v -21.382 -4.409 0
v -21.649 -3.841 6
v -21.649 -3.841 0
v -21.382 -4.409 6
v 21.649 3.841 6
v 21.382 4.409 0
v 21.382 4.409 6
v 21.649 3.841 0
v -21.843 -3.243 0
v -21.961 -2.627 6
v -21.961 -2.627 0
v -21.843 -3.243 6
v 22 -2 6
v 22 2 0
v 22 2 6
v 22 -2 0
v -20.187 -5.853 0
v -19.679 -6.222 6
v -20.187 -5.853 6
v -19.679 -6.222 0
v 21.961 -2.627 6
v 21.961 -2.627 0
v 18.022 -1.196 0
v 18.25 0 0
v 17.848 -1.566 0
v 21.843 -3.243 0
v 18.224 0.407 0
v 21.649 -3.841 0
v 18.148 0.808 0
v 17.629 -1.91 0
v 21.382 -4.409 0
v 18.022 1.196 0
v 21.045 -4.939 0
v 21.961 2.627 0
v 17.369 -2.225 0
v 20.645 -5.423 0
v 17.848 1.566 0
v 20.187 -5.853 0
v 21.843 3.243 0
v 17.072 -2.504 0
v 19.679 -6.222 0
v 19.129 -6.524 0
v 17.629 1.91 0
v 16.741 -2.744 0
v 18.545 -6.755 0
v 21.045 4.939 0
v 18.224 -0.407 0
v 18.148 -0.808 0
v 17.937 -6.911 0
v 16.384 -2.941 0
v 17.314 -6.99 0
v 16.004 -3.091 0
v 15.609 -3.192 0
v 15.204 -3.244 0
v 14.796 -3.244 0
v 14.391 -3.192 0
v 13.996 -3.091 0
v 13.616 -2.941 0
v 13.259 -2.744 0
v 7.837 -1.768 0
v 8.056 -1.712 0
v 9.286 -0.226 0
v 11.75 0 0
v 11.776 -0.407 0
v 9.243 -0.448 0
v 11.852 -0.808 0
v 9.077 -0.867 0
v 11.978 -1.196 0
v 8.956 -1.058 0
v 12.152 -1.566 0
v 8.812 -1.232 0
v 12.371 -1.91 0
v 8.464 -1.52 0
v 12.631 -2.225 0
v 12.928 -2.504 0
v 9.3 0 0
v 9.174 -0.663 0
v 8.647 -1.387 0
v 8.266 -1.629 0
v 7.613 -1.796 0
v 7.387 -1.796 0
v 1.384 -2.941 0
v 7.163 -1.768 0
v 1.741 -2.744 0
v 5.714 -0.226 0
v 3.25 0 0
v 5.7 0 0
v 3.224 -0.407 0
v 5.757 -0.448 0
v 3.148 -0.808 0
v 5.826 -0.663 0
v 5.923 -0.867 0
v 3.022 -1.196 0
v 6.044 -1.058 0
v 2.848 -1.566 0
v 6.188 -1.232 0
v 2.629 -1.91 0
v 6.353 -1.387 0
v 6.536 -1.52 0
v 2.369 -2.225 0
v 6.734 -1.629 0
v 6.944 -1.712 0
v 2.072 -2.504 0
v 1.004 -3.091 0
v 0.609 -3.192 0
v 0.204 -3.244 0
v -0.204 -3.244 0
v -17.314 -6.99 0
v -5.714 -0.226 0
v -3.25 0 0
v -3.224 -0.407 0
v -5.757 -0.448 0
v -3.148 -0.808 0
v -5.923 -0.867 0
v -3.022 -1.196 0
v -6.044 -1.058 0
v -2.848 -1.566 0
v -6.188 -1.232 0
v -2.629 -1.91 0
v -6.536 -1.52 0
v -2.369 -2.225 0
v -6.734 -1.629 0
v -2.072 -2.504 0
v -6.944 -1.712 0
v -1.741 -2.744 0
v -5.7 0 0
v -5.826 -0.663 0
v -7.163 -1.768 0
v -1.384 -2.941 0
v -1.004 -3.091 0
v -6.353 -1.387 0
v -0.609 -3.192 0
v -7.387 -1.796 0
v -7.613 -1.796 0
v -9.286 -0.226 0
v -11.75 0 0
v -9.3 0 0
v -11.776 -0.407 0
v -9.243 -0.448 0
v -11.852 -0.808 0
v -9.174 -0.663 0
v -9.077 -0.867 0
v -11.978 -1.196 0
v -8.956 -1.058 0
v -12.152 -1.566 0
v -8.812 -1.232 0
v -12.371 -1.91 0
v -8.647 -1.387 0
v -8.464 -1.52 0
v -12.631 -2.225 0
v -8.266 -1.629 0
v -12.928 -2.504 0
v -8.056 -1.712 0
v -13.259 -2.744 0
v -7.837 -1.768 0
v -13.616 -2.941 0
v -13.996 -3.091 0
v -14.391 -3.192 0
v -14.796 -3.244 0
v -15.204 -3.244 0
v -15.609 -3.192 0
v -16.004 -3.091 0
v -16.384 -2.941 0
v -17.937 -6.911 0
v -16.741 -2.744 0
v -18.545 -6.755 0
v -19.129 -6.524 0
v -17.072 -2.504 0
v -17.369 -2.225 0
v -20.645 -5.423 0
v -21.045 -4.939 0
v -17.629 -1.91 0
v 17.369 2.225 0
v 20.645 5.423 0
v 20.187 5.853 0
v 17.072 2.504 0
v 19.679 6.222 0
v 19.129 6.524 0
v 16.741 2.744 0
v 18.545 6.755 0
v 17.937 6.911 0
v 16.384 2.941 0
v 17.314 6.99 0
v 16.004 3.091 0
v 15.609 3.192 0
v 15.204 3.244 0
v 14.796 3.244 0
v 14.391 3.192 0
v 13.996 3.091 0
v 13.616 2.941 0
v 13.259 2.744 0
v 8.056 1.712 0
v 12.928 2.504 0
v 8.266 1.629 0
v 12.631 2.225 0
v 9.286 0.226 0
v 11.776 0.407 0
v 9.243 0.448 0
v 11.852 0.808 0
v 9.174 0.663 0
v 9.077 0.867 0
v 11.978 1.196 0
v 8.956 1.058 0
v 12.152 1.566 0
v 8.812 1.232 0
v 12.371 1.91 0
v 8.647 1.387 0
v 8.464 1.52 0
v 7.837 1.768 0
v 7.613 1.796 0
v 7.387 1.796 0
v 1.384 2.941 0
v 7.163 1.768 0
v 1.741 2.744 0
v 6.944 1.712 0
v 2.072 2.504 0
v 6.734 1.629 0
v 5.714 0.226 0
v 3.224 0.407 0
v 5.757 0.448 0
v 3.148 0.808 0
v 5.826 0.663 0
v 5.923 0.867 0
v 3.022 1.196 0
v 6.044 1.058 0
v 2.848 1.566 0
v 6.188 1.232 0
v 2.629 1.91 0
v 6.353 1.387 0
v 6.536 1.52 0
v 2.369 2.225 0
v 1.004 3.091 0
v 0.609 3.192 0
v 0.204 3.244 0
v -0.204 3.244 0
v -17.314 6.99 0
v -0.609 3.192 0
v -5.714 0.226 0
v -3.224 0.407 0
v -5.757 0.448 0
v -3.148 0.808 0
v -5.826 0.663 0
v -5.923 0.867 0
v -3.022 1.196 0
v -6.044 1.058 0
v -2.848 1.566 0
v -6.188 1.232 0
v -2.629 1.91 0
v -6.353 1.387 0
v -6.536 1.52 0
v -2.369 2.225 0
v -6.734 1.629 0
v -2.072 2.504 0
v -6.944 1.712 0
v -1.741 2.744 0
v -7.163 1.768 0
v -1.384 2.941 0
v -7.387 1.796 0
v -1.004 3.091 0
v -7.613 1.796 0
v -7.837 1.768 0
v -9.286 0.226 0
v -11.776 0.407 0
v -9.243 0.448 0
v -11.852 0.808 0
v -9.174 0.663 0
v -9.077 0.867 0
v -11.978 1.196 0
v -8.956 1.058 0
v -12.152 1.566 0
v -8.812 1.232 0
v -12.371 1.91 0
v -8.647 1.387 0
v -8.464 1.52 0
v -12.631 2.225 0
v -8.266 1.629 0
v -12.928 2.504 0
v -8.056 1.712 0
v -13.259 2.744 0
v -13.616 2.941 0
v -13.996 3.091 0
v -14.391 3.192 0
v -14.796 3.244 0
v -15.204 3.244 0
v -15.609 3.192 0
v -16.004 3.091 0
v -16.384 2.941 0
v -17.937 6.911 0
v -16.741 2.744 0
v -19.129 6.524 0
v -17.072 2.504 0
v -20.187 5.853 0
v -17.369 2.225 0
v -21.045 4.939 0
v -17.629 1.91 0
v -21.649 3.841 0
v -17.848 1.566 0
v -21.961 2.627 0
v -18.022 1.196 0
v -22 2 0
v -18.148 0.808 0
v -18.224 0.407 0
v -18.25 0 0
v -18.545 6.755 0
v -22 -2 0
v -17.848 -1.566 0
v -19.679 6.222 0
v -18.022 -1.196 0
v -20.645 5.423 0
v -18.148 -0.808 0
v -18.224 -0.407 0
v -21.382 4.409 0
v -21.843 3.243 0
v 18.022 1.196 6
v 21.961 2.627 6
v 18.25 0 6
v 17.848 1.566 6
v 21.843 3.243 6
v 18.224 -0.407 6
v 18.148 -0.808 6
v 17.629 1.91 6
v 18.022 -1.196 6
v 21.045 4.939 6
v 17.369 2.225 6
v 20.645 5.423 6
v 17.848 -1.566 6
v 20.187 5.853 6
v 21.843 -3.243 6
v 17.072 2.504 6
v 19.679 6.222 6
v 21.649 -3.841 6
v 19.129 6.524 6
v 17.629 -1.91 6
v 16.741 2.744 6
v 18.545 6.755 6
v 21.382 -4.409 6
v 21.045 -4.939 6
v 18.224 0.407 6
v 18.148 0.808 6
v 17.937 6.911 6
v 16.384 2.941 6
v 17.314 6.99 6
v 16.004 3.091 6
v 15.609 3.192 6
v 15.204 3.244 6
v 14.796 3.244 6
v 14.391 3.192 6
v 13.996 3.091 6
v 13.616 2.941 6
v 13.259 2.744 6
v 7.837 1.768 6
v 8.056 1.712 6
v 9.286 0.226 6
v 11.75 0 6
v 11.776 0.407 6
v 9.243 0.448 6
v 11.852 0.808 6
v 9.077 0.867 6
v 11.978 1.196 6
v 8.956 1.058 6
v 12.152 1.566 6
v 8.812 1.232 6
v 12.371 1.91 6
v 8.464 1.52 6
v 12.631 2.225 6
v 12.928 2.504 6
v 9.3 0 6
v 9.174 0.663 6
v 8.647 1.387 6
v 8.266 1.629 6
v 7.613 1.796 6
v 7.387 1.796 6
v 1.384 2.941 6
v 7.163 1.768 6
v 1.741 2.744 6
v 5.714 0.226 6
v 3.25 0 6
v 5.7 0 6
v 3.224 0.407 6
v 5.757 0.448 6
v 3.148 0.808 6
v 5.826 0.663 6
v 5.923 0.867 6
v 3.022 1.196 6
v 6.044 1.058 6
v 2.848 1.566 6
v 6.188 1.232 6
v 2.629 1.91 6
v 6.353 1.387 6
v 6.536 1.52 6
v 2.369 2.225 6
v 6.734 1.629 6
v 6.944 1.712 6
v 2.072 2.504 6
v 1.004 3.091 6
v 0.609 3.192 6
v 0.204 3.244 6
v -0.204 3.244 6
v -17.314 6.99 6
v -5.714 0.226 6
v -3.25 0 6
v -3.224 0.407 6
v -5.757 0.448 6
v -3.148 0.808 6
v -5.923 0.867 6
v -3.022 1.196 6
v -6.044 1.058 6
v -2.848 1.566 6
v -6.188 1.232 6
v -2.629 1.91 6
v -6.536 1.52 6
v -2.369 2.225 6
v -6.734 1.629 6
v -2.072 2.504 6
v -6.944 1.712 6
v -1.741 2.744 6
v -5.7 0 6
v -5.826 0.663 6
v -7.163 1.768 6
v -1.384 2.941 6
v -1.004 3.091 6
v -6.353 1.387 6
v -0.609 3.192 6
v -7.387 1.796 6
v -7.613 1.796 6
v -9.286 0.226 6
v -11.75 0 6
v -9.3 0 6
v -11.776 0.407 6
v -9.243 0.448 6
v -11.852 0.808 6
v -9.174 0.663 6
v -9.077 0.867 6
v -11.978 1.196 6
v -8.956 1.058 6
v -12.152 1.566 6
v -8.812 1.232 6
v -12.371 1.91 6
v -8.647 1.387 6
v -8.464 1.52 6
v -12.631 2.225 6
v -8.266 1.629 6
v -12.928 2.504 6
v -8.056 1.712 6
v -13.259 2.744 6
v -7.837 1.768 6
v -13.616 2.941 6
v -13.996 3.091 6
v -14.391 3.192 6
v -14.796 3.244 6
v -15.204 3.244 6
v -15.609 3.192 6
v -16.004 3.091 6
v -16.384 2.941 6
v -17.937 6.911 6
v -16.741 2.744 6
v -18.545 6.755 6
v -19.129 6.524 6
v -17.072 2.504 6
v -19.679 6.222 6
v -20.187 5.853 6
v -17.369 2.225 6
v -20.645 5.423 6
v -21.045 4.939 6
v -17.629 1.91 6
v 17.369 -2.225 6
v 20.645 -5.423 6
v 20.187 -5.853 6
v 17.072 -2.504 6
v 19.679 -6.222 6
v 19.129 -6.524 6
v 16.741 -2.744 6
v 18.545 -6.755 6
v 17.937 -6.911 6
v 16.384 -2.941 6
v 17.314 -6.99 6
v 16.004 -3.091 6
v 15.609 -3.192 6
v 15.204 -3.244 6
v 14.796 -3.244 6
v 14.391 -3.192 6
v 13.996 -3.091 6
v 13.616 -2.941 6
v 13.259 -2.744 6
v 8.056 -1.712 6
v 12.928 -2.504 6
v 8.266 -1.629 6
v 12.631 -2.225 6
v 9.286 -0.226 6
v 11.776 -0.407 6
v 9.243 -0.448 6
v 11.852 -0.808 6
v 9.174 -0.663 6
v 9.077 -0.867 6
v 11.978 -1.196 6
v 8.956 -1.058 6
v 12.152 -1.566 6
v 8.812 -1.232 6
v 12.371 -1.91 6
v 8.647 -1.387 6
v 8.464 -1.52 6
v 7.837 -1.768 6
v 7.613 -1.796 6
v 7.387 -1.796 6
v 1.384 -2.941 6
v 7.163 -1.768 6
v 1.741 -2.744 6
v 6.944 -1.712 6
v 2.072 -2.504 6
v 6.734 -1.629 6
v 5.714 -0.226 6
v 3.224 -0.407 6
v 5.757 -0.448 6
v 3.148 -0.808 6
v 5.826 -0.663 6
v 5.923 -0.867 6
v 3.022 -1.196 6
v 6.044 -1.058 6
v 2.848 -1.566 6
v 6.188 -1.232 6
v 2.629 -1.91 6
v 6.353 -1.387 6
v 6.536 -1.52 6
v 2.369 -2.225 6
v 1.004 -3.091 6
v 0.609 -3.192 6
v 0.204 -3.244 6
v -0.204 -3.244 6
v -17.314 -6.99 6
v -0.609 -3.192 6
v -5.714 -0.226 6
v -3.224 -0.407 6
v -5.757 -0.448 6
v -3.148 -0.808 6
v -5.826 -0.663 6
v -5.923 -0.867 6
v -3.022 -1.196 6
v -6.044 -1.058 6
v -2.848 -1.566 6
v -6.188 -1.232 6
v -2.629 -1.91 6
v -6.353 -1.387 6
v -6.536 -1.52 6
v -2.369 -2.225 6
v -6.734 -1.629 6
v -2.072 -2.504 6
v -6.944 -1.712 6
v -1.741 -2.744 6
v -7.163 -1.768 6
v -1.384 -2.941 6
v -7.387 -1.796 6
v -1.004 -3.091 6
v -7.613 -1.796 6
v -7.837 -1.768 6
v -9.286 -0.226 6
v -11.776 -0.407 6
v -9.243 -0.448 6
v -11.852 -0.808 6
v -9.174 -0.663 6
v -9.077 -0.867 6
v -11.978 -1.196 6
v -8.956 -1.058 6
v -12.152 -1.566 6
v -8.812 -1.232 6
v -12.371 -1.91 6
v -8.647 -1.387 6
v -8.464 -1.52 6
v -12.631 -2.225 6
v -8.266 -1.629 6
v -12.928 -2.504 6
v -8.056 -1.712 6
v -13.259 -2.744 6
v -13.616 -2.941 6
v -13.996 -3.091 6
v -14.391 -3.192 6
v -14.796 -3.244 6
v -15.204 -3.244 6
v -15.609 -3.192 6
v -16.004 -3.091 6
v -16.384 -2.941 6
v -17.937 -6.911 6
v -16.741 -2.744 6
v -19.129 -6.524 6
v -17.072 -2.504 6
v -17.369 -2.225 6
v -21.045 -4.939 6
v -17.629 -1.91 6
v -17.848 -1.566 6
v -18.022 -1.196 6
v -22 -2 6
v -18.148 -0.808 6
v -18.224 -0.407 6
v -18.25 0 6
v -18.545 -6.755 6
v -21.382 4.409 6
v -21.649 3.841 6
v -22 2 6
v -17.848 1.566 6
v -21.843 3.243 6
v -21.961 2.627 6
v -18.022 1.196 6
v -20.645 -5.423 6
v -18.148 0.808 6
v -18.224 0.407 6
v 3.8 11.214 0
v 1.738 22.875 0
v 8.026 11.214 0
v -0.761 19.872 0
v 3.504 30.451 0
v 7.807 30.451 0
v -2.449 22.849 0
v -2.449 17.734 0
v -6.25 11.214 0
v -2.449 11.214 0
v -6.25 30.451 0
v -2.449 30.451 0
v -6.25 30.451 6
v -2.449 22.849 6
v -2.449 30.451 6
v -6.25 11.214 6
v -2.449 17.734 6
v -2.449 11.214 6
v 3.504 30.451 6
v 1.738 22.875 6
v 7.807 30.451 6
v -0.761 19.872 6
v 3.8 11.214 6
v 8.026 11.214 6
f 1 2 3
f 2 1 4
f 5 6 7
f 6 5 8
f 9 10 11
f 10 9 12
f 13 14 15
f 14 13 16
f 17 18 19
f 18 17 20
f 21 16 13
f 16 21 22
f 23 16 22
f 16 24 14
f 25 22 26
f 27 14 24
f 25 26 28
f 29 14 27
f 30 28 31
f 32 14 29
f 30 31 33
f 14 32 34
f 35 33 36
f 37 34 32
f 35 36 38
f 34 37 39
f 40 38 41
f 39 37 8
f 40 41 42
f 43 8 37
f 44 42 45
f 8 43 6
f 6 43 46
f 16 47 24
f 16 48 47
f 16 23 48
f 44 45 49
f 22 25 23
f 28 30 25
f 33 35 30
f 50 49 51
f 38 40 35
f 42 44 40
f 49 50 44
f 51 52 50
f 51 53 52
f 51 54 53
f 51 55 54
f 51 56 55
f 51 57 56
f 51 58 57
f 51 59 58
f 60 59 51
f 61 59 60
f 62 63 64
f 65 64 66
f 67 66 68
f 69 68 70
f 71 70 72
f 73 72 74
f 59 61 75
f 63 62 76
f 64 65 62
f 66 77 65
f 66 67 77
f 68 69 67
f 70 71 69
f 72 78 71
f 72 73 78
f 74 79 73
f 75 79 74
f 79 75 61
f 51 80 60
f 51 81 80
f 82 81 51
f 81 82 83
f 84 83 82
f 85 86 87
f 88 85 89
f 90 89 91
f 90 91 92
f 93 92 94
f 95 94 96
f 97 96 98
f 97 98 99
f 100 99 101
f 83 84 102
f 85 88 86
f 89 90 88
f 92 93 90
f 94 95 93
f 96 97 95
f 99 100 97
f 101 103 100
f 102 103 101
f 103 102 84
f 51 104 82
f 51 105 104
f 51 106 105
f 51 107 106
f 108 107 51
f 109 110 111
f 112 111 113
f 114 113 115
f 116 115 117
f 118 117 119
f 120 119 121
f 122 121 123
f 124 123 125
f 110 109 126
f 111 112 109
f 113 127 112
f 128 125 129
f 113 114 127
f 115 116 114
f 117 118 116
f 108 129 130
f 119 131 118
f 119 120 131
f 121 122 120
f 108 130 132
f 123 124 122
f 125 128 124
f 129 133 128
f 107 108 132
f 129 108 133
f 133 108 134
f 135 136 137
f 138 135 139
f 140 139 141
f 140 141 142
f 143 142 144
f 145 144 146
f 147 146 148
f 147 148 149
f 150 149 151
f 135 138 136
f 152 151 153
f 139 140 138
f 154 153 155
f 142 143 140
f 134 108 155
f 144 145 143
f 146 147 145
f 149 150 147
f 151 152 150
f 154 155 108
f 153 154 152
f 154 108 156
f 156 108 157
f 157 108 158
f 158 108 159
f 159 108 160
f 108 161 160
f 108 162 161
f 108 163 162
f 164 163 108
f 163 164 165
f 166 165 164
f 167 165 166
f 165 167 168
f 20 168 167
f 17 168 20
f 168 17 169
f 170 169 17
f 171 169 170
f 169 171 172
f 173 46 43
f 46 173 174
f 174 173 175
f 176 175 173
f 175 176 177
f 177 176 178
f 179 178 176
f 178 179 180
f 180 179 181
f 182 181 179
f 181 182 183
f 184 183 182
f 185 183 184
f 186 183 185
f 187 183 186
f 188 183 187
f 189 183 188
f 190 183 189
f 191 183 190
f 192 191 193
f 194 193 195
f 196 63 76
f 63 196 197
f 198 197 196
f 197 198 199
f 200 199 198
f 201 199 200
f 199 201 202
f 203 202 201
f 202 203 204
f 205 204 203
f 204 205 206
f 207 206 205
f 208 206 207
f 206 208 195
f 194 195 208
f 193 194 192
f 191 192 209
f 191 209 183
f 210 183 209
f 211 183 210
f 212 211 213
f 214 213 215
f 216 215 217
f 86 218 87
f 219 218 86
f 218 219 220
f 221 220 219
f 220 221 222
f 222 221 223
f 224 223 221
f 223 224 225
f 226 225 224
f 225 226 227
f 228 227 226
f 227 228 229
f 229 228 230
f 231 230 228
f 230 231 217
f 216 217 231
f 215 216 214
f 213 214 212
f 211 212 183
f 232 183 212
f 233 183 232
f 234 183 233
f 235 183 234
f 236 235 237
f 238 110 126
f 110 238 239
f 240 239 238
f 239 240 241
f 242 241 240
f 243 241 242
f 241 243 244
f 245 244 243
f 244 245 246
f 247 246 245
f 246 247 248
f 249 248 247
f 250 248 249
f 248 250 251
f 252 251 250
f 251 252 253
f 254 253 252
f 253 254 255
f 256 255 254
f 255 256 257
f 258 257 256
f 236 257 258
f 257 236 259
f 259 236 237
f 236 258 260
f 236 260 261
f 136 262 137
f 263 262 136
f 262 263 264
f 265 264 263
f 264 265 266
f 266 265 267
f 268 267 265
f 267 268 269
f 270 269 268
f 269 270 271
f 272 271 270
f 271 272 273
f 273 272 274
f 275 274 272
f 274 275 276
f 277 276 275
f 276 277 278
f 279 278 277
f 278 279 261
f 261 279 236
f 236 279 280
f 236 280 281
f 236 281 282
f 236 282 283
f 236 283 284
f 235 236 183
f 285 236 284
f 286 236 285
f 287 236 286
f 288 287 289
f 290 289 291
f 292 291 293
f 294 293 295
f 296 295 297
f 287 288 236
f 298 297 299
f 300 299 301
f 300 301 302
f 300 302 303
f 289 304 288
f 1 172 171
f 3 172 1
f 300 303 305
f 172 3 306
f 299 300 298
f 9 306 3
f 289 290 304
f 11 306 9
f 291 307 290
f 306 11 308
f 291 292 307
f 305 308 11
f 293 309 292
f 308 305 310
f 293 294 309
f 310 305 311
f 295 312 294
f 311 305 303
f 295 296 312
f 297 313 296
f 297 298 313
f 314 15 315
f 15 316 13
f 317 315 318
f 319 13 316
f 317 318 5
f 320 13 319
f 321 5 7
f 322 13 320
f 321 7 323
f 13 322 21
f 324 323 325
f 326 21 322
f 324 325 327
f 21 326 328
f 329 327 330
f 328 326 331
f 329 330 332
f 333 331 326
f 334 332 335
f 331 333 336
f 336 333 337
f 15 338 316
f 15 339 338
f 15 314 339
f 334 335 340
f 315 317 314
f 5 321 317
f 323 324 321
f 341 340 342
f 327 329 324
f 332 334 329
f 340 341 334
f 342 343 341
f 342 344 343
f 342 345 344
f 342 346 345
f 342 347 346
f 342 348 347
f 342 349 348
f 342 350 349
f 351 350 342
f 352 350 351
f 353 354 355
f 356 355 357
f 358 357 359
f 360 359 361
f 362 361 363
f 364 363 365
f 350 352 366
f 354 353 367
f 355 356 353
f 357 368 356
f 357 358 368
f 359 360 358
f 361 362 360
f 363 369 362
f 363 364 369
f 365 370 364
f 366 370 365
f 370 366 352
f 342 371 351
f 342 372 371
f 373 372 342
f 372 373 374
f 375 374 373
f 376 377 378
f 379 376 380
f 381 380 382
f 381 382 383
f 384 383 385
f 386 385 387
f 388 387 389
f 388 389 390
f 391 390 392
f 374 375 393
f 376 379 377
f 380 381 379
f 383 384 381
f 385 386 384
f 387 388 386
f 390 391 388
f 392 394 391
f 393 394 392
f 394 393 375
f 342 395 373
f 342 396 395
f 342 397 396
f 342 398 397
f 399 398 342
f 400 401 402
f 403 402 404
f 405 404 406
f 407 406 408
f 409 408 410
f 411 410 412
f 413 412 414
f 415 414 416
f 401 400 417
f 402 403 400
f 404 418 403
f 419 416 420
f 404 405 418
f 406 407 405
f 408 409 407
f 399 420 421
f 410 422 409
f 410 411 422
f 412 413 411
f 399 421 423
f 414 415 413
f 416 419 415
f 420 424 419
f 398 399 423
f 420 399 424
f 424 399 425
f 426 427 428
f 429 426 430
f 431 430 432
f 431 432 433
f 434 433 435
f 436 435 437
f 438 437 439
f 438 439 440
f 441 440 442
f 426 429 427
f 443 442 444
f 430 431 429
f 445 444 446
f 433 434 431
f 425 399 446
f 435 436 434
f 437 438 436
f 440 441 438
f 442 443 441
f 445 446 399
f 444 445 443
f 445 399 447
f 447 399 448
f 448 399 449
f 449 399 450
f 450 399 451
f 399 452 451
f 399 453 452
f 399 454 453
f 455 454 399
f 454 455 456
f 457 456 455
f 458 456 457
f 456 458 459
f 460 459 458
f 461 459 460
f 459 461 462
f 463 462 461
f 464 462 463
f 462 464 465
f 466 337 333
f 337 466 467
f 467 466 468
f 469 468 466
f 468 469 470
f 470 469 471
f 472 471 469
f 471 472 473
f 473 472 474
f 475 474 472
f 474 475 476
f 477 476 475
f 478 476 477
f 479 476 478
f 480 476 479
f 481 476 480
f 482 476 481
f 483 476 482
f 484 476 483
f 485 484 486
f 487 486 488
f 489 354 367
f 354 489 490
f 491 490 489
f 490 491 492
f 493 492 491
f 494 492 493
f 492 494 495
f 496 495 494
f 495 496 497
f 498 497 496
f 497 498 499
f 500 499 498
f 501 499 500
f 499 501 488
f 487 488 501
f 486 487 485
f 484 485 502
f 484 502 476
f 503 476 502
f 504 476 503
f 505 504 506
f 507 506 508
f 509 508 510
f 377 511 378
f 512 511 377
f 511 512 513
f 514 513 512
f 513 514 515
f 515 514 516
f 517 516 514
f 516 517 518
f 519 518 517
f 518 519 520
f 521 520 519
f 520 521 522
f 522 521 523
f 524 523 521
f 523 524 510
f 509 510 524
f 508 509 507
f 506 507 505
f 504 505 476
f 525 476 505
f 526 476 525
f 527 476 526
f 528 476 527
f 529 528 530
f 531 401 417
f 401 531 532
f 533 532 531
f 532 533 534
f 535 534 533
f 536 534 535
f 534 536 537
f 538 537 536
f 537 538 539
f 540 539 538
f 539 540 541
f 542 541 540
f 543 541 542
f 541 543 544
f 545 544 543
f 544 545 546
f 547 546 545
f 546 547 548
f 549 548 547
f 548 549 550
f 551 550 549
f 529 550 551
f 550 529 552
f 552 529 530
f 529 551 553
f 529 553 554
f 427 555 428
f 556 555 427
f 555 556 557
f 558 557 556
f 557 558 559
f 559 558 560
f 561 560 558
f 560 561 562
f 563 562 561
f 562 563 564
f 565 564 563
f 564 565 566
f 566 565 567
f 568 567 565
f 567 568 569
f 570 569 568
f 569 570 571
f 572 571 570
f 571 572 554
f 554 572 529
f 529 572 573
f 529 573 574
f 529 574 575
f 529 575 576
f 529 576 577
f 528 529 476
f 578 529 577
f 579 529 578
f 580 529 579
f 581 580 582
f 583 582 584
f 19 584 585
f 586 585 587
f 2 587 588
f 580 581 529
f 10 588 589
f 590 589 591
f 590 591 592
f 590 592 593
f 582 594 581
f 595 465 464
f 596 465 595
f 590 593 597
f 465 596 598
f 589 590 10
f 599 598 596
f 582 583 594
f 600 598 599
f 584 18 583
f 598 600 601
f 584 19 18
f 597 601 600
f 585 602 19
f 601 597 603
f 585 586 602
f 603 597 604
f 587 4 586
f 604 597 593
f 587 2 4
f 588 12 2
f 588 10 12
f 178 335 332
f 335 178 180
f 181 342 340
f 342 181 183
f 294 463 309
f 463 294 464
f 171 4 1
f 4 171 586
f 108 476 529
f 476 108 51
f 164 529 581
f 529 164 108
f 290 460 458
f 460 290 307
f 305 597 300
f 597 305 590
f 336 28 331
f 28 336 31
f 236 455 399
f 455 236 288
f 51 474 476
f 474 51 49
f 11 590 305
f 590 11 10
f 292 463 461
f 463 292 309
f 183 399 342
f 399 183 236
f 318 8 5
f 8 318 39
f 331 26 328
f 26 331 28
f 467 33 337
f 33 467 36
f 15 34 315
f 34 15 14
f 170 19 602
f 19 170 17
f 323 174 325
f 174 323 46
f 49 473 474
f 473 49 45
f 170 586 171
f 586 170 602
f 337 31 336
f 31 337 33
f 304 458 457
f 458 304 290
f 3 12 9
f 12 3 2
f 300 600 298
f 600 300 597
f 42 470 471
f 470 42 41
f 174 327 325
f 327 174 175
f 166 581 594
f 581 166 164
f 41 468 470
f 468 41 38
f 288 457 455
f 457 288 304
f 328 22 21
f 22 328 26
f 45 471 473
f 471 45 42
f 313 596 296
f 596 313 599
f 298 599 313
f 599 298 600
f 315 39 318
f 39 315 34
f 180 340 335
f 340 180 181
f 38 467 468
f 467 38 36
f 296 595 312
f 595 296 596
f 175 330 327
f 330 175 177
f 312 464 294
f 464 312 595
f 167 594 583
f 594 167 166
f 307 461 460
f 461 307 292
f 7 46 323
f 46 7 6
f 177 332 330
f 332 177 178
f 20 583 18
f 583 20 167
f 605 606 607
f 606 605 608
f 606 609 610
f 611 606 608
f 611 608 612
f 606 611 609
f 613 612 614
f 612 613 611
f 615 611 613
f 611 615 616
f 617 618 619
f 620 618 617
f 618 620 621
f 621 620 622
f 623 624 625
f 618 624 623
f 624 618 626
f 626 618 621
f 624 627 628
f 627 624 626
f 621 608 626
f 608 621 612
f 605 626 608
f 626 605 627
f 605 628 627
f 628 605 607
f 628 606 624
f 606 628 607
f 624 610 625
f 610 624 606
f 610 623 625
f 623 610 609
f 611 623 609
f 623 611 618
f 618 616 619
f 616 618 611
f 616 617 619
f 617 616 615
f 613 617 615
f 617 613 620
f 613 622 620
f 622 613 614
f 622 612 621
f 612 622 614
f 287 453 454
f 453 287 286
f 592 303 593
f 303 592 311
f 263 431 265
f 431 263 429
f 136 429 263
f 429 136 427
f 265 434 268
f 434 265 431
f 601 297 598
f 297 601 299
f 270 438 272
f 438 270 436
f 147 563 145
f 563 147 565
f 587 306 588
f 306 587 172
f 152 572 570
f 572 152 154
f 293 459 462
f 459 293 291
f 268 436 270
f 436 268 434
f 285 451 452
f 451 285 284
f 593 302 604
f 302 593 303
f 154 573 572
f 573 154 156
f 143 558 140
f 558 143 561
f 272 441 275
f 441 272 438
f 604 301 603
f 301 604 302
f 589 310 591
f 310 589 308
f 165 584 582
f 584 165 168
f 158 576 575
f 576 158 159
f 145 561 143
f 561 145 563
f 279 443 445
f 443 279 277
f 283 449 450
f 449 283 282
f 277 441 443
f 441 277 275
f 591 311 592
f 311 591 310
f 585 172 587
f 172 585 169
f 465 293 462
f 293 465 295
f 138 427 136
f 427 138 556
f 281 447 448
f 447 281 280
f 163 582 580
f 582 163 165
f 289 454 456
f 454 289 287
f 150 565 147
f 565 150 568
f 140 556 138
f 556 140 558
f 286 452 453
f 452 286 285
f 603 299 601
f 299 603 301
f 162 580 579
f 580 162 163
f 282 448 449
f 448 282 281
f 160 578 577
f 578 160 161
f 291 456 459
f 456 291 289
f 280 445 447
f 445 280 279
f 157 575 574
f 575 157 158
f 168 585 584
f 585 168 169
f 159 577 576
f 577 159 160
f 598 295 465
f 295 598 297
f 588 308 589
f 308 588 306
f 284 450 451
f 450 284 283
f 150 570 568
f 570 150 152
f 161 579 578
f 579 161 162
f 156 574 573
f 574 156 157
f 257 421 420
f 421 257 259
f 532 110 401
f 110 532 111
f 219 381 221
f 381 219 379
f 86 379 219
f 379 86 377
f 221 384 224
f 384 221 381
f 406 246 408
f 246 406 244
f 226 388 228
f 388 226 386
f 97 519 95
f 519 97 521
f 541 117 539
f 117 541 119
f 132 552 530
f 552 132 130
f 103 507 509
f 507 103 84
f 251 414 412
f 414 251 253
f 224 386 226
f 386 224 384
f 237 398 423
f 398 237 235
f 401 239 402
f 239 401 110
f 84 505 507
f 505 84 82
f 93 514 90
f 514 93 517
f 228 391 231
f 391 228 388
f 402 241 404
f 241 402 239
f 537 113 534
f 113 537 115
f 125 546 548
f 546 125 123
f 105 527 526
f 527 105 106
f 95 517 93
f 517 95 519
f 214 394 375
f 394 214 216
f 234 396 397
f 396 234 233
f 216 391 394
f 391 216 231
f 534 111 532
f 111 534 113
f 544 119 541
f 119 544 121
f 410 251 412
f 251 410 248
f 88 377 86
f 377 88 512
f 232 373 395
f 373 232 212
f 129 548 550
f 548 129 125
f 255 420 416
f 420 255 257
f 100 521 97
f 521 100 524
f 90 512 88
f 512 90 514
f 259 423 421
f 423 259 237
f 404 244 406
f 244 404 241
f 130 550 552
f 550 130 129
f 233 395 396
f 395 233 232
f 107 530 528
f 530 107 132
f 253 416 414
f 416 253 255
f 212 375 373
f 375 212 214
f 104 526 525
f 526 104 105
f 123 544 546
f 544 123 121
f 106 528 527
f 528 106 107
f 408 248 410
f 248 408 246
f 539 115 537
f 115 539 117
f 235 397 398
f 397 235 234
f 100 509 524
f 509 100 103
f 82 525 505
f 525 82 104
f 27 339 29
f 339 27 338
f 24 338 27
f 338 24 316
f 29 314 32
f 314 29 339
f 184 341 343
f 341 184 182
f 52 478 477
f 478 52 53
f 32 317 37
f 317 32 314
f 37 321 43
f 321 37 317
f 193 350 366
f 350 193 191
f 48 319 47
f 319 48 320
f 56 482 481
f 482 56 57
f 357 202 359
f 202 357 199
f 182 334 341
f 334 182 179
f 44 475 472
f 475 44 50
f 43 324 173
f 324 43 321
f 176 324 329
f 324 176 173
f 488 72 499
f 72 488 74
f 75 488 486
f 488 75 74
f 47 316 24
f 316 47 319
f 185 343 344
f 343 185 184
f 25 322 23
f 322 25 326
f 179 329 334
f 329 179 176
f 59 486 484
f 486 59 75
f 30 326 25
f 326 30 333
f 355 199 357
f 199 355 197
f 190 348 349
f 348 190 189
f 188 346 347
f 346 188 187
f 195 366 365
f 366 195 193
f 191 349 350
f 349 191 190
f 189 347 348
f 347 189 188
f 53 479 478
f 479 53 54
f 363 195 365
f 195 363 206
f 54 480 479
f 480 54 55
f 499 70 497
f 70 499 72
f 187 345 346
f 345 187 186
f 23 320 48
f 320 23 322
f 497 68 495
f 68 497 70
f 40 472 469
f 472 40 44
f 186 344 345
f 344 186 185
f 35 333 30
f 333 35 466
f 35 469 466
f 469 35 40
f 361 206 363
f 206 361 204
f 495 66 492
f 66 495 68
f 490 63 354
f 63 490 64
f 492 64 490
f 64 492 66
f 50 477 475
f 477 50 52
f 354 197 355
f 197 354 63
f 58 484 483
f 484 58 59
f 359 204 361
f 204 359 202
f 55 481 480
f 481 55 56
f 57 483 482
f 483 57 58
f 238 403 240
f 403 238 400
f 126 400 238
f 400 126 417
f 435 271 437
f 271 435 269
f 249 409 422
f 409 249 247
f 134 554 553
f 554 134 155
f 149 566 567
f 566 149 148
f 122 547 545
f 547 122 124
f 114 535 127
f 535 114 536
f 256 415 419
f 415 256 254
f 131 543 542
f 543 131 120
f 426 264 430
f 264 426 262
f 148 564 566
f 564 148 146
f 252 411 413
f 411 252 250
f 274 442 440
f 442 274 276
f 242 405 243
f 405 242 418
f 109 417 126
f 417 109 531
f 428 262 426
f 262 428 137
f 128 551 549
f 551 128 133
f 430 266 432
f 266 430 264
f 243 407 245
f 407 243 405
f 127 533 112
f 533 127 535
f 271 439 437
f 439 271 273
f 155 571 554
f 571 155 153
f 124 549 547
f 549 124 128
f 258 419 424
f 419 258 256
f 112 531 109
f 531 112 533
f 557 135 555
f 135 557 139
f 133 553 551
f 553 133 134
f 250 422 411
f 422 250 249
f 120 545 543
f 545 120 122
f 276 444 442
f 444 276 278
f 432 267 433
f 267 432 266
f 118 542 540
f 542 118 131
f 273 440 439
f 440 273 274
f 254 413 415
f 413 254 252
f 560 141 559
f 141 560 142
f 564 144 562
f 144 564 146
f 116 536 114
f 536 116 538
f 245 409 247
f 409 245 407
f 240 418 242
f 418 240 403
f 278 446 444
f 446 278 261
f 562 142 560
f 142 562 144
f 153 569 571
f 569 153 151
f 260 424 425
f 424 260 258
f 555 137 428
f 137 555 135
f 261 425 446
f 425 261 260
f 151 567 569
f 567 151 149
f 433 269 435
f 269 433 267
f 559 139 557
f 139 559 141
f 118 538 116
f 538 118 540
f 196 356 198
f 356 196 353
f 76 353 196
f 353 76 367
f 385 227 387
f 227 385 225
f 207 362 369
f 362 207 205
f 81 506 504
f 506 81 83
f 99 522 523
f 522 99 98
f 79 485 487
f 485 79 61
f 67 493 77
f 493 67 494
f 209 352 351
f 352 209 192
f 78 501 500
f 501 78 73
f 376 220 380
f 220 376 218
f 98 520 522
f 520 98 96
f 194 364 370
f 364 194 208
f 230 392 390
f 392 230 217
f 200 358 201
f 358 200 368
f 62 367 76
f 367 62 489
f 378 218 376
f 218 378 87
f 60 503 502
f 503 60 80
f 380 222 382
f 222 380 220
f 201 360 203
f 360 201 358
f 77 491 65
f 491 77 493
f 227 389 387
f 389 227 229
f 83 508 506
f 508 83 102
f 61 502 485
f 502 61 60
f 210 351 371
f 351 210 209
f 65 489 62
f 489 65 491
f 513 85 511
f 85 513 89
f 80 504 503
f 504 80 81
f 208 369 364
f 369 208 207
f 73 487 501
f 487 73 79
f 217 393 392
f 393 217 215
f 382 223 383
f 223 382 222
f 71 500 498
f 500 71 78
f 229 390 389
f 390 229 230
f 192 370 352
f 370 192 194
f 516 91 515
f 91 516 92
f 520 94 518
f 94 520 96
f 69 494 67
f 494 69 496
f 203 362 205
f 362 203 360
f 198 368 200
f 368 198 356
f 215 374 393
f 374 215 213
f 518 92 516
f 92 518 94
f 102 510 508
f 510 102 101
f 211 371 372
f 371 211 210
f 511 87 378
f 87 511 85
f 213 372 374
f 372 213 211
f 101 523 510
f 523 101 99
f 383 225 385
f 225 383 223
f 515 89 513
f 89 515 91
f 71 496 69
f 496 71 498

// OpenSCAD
$fn = 50;


difference() {
	union() {
		hull() {
			translate(v = [-17.0000000000, 2.0000000000, 0]) {
				cylinder(h = 6, r = 5);
			}
			translate(v = [17.0000000000, 2.0000000000, 0]) {
				cylinder(h = 6, r = 5);
			}
			translate(v = [-17.0000000000, -2.0000000000, 0]) {
				cylinder(h = 6, r = 5);
			}
			translate(v = [17.0000000000, -2.0000000000, 0]) {
				cylinder(h = 6, r = 5);
			}
		}
		translate(v = [0, 30.0000000000, 0]) {
			linear_extrude(height = 6) {
				text(font = "DejaVu Sans Mono:style=Bold", halign = "center", size = 19.0000000000, text = "K", valign = "top");
			}
		}
	}
	union() {
		translate(v = [-15.0000000000, 0.0000000000, 0]) {
			translate(v = [0, 0, -100]) {
				cylinder(h = 200, r = 3.2500000000);
			}
		}
		translate(v = [0, 0, -100]) {
			cylinder(h = 200, r = 3.2500000000);
		}
		translate(v = [15.0000000000, 0.0000000000, 0]) {
			translate(v = [0, 0, -100]) {
				cylinder(h = 200, r = 3.2500000000);
			}
		}
		translate(v = [-15.0000000000, 0.0000000000, 0]) {
			translate(v = [0, 0, -100]) {
				cylinder(h = 200, r = 1.8000000000);
			}
		}
		translate(v = [-7.5000000000, 0.0000000000, 0]) {
			translate(v = [0, 0, -100]) {
				cylinder(h = 200, r = 1.8000000000);
			}
		}
		translate(v = [0, 0, -100]) {
			cylinder(h = 200, r = 1.8000000000);
		}
		translate(v = [7.5000000000, 0.0000000000, 0]) {
			translate(v = [0, 0, -100]) {
				cylinder(h = 200, r = 1.8000000000);
			}
		}
		translate(v = [15.0000000000, 0.0000000000, 0]) {
			translate(v = [0, 0, -100]) {
				cylinder(h = 200, r = 1.8000000000);
			}
		}
	}
}
